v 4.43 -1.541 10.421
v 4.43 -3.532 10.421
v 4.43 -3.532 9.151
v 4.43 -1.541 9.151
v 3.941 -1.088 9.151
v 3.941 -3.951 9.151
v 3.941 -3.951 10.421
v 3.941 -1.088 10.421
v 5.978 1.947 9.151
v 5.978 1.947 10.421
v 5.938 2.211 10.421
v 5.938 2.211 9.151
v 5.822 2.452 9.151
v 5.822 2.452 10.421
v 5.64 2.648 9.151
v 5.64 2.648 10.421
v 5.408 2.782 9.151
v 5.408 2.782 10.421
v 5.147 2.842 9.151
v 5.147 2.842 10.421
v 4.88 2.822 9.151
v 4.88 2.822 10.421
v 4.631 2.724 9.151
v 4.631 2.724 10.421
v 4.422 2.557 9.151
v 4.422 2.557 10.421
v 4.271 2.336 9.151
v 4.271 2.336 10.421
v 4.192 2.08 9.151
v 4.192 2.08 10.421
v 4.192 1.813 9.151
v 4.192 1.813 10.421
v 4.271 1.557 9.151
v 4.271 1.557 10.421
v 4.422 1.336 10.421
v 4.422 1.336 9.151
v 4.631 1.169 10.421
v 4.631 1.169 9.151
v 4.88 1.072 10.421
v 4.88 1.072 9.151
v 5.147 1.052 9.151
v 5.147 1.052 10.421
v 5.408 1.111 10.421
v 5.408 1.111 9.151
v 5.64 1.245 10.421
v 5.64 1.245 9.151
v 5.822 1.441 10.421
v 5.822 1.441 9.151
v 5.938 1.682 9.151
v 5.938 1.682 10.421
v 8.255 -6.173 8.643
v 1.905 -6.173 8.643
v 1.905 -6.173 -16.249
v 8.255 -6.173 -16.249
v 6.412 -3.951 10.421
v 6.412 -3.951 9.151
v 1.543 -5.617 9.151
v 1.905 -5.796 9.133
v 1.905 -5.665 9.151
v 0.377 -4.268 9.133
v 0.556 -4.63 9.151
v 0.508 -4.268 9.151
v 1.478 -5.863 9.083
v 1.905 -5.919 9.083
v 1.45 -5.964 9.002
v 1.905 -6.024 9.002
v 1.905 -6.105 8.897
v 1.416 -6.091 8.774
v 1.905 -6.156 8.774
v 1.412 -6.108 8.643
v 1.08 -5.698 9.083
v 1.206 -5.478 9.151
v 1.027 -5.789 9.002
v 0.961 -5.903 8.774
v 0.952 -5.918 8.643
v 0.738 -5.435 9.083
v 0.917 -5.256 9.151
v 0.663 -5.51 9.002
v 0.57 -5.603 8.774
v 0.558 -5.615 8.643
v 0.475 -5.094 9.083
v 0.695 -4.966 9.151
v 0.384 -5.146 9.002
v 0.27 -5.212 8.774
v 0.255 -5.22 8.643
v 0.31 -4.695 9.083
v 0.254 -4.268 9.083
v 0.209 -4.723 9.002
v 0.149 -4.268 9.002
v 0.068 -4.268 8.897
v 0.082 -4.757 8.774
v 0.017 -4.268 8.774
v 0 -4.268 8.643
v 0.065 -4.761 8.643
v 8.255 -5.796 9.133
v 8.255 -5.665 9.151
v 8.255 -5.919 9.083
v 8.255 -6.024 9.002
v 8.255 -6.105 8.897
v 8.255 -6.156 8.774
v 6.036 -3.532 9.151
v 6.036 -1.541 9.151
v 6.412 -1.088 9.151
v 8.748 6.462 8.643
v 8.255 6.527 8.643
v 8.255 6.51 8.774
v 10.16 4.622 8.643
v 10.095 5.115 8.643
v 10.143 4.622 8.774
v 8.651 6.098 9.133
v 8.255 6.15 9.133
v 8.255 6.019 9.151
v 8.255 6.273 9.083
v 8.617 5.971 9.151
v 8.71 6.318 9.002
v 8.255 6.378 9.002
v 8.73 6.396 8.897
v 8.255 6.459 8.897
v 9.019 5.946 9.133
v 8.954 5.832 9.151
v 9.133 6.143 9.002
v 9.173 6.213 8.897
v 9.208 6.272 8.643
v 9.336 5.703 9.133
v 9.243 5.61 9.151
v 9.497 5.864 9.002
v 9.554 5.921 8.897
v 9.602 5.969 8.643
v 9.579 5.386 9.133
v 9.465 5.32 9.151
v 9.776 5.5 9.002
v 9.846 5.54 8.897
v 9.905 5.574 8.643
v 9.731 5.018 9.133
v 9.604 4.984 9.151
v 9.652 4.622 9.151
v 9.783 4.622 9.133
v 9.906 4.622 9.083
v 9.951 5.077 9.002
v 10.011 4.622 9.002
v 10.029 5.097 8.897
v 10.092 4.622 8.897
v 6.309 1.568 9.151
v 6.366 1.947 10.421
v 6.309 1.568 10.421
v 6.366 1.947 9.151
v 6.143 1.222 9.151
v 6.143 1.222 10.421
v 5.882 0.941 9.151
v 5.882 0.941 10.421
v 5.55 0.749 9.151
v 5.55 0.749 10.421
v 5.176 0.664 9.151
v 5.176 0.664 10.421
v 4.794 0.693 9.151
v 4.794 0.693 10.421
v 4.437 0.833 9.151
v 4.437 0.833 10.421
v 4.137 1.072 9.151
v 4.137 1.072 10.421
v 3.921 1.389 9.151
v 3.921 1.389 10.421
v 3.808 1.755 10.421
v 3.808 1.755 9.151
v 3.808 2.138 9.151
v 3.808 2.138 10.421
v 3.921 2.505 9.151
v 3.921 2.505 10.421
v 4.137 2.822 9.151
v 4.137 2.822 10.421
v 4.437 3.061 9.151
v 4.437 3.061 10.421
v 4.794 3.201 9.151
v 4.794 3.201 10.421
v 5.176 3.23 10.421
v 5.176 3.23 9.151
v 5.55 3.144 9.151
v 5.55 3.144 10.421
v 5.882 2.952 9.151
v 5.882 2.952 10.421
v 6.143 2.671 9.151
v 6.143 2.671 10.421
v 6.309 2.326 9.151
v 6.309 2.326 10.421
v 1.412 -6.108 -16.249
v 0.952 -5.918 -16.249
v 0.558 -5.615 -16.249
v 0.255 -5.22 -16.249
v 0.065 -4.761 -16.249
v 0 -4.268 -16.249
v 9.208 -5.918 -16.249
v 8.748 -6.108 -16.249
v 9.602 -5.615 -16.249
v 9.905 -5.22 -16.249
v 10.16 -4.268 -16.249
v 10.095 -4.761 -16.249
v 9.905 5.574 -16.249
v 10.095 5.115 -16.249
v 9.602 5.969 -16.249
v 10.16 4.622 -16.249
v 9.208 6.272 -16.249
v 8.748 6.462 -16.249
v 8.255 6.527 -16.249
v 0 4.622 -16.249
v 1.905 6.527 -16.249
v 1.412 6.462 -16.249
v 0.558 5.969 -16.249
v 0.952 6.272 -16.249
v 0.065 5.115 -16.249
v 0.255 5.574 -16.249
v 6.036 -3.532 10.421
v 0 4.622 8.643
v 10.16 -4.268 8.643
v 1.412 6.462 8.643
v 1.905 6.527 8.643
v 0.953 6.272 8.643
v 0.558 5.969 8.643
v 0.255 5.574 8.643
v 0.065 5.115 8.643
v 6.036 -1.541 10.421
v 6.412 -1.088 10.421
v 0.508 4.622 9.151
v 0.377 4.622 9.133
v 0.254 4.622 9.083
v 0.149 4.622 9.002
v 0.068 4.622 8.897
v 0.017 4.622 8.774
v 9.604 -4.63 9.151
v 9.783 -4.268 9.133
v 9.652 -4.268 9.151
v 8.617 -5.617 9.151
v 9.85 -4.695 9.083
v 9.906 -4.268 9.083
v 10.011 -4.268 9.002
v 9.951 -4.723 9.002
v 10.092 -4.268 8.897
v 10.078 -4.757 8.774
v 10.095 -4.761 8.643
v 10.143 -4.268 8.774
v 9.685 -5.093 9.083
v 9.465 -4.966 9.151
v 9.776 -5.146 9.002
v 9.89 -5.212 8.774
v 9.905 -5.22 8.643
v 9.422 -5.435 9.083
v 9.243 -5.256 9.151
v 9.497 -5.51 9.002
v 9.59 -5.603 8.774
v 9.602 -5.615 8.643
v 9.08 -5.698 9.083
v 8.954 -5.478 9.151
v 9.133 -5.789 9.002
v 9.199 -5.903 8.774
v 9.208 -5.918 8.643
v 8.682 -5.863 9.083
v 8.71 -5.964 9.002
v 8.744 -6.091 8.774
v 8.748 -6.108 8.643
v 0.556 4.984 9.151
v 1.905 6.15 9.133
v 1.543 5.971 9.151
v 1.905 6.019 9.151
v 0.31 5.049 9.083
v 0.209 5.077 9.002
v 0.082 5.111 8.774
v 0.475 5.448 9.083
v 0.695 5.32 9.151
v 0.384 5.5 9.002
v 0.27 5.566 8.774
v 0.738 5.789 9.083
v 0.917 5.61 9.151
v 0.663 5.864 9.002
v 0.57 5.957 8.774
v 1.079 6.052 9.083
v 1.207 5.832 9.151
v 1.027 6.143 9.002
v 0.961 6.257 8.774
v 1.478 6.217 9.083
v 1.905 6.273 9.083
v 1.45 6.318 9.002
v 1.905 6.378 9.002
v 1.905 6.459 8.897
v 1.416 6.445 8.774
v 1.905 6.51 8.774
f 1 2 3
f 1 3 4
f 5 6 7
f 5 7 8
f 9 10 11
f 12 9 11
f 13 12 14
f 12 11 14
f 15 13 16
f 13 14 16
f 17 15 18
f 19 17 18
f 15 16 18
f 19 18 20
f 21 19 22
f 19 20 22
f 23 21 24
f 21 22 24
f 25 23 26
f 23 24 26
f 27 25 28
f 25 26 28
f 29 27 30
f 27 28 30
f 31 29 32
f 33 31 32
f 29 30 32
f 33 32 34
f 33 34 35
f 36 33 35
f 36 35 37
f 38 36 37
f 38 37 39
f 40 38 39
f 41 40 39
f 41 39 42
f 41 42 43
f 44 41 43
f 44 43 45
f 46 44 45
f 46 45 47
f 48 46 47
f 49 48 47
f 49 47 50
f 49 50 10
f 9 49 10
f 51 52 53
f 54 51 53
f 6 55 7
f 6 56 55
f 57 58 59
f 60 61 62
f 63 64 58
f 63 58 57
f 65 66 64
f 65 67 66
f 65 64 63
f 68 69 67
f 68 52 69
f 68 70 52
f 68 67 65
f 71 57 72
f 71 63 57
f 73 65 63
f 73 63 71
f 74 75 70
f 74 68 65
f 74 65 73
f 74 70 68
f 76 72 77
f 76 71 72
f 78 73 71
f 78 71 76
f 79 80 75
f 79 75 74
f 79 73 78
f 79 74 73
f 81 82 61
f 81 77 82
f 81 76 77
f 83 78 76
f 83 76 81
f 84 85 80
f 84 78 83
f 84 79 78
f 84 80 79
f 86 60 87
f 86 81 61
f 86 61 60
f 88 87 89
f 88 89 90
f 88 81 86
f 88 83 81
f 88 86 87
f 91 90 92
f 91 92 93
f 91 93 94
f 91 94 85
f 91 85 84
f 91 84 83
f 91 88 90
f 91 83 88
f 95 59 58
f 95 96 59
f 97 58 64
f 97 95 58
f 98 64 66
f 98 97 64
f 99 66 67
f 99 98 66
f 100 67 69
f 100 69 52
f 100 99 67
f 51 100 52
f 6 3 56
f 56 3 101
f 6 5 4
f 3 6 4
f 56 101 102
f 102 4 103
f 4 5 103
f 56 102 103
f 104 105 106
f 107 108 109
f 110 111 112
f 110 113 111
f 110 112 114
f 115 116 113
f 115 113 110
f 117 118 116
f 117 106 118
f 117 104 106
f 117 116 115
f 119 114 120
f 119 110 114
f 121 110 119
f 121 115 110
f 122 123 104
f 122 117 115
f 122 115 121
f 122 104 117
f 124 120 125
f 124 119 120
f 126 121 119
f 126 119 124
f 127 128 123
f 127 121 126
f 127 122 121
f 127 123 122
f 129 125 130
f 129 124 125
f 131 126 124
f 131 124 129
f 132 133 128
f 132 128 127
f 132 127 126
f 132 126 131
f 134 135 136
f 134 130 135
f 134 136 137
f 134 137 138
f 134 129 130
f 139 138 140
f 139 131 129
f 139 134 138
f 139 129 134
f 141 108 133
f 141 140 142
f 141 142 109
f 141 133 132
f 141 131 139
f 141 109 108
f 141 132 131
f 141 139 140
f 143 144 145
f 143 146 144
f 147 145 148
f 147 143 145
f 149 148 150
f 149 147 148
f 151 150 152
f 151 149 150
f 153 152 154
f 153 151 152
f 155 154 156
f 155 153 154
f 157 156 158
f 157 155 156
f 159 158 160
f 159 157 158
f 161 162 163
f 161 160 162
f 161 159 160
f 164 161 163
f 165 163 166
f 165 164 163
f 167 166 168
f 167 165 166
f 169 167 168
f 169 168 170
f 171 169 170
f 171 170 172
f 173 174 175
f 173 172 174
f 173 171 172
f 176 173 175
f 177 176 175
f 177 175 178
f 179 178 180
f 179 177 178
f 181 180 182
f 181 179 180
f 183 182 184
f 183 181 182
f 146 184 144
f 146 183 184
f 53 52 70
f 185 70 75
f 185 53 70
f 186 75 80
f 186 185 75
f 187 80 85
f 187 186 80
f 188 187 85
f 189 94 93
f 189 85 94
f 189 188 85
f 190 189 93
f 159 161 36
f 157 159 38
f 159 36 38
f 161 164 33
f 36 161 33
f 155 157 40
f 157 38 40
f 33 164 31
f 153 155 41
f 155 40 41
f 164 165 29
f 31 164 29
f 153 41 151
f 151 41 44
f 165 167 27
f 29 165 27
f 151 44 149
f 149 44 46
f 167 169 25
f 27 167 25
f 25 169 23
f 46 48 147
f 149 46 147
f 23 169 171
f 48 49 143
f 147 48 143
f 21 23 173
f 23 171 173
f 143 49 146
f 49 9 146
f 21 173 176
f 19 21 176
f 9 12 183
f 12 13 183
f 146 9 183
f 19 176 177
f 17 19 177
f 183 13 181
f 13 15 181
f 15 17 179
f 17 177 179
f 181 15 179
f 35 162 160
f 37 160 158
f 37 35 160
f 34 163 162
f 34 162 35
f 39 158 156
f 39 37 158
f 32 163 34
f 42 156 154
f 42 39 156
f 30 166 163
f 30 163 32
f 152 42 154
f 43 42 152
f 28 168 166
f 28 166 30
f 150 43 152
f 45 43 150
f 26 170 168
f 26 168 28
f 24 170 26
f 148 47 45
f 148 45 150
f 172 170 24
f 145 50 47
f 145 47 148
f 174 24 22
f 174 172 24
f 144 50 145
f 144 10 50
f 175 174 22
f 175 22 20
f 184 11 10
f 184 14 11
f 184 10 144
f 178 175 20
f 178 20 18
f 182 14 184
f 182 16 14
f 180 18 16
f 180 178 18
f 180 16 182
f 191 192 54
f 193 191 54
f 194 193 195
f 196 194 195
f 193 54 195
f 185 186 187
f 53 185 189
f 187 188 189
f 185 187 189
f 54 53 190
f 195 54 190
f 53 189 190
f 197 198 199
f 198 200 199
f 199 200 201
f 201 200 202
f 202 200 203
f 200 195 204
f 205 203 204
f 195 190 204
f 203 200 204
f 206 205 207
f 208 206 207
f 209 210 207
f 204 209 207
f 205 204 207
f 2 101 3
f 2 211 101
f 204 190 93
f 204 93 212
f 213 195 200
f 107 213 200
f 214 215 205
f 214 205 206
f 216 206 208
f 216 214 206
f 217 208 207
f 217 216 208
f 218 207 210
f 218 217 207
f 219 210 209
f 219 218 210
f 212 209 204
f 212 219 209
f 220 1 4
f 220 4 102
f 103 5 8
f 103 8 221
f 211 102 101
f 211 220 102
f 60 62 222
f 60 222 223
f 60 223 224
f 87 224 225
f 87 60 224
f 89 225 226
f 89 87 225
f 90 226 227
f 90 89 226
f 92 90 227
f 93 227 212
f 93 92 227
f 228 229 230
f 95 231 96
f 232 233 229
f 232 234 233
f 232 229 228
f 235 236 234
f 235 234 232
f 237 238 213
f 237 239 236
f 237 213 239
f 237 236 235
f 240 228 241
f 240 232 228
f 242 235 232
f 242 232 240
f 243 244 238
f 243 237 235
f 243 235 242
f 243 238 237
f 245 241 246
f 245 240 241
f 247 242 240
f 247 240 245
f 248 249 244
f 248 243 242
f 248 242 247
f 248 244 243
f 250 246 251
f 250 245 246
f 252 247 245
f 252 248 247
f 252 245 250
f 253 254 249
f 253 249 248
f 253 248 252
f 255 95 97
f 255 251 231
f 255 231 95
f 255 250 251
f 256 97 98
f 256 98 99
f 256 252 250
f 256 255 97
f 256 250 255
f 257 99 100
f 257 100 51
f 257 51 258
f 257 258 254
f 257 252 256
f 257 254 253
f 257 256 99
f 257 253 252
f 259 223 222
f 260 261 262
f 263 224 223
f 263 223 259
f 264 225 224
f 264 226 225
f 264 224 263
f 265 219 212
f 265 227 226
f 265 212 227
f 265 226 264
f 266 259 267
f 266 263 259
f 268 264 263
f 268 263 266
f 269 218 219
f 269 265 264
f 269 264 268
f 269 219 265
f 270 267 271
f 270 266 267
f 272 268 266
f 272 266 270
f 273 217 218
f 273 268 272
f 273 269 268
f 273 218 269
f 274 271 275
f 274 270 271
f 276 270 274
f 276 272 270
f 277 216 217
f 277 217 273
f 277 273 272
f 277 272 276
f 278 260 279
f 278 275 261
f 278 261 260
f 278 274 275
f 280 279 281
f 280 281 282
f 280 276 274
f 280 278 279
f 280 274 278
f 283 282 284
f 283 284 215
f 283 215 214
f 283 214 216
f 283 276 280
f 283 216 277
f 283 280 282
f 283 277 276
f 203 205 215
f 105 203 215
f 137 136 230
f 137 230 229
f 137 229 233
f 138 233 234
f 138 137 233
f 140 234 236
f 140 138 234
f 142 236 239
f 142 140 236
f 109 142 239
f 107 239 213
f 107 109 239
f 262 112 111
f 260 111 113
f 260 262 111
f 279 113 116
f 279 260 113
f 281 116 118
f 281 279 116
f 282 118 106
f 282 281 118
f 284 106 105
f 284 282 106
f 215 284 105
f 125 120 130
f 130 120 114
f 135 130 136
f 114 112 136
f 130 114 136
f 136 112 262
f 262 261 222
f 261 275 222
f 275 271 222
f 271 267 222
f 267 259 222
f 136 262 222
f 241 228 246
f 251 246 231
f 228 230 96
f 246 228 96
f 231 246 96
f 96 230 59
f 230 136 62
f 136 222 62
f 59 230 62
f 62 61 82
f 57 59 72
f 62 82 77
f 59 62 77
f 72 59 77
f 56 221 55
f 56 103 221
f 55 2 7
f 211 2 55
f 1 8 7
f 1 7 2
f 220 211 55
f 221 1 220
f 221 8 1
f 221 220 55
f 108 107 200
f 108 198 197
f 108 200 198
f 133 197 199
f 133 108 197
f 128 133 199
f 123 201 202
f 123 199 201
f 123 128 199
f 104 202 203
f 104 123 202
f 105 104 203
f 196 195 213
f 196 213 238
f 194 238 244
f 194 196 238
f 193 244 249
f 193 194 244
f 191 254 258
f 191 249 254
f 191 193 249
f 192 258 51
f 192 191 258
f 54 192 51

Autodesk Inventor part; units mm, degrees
ref_plane "YZ Plane" through (0, 0, 0) normal (1, 0, 0) x (0, 1, 0)
ref_plane "XZ Plane" through (0, 0, 0) normal (0, 1, 0) x (-1, 0, 0)
ref_plane "XY Plane" through (0, 0, 0) normal (0, 0, 1) x (1, 0, 0)
sketch "Sketch1" plane through (0, 0, 0) normal (1, 0, 0) x (0, 1, 0)
  line L0 (6.527, 9.1506) -> (-6.173, 9.1506)
  line L1 (-6.173, 9.1506) -> (-6.173, -16.2494)
  line L2 (-6.173, -16.2494) -> (6.527, -16.2494)
  line L3 (6.527, -16.2494) -> (6.527, 9.1506)
  point P0 (0, 0)
extrude "Extrusion1" add sketch "Sketch1" along normal blind 10.16
sketch "Sketch2" plane through (0, -6.173, 9.1506) normal (0, 0, 1) x (1, 0, 0)
  circle A0 centre (5.08, 8.1197) radius 0.9096
  circle A1 centre (5.08, 8.1197) radius 1.2864
  line L0 (4.2941, 4.7416) -> (6.0229, 4.7416)
  line L1 (6.0229, 4.7416) -> (6.0229, 2.6232)
  line L2 (6.0229, 2.6232) -> (4.2941, 2.6232)
  line L3 (4.2941, 2.6232) -> (4.2941, 4.7416)
  line L4 (3.9413, 5.0852) -> (6.4125, 5.0852)
  line L5 (6.4125, 5.0852) -> (6.4125, 2.2224)
  line L6 (6.4125, 2.2224) -> (3.9413, 2.2224)
  line L7 (3.9413, 2.2224) -> (3.9413, 5.0852)
  point P0 (0, 6.173)
extrude "Extrusion2" add sketch "Sketch2" along normal blind 1.27 separate body contours A0 | A1 | L0 L1 L2 L3 | L4 L5 L6 L7
sketch "Sketch3" plane through (0, -6.173, 9.1506) normal (0, 0, 1) x (1, 0, 0)
  circle A0 centre (5.0656, 8.1486) radius 0.9611
  line L0 (4.2551, 4.6027) -> (6.0267, 4.6027)
  line L1 (6.0267, 4.6027) -> (6.0267, 2.6271)
  line L2 (6.0267, 2.6271) -> (4.2551, 2.6271)
  line L3 (4.2551, 2.6271) -> (4.2551, 4.6027)
  point P0 (0, 6.173)
sketch "Sketch4" plane through (0, -6.173, 9.1506) normal (0, 0, 1) x (1, 0, 0)
  point P0 (0, 6.173)
sketch "Sketch5" plane through (5.08, 1.9467, 10.4206) normal (0, 0, 1) x (1, 0, 0)
  circle A0 centre (0, 0) radius 0.8976
  point P0 (-5.08, -1.9467)
extrude "Extrusion3" cut sketch "Sketch5" against normal blind 1.27 bodies 2
sketch "Sketch6" plane through (0, -6.173, 10.4206) normal (0, 0, 1) x (1, 0, 0)
  point P0 (0, 6.173)
sketch "Sketch7" plane through (0, -6.173, 10.4206) normal (0, 0, 1) x (1, 0, 0)
  line L0 (4.4305, 4.6319) -> (6.0358, 4.6319)
  line L1 (6.0358, 4.6319) -> (6.0358, 2.6414)
  line L2 (6.0358, 2.6414) -> (4.4305, 2.6414)
  line L3 (4.4305, 2.6414) -> (4.4305, 4.6319)
  point P0 (0, 6.173)
extrude "Extrusion4" cut sketch "Sketch7" against normal blind 1.27 bodies 2
fillet "Fillet1" radius 1.905 4 edges at (10.16, 6.527, -3.5494) (0, 6.527, -3.5494) (10.16, -6.173, -3.5494) (0, -6.173, -3.5494)
fillet "Fillet2" radius 0.508 8 edges at (9.602, -5.615, 9.1506) (5.08, -6.173, 9.1506) (0.558, -5.615, 9.1506) (0, 0.177, 9.1506) (0.558, 5.969, 9.1506) (5.08, 6.527, 9.1506) (9.602, 5.969, 9.1506) (10.16, 0.177, 9.1506)
properties part number "Battery"
